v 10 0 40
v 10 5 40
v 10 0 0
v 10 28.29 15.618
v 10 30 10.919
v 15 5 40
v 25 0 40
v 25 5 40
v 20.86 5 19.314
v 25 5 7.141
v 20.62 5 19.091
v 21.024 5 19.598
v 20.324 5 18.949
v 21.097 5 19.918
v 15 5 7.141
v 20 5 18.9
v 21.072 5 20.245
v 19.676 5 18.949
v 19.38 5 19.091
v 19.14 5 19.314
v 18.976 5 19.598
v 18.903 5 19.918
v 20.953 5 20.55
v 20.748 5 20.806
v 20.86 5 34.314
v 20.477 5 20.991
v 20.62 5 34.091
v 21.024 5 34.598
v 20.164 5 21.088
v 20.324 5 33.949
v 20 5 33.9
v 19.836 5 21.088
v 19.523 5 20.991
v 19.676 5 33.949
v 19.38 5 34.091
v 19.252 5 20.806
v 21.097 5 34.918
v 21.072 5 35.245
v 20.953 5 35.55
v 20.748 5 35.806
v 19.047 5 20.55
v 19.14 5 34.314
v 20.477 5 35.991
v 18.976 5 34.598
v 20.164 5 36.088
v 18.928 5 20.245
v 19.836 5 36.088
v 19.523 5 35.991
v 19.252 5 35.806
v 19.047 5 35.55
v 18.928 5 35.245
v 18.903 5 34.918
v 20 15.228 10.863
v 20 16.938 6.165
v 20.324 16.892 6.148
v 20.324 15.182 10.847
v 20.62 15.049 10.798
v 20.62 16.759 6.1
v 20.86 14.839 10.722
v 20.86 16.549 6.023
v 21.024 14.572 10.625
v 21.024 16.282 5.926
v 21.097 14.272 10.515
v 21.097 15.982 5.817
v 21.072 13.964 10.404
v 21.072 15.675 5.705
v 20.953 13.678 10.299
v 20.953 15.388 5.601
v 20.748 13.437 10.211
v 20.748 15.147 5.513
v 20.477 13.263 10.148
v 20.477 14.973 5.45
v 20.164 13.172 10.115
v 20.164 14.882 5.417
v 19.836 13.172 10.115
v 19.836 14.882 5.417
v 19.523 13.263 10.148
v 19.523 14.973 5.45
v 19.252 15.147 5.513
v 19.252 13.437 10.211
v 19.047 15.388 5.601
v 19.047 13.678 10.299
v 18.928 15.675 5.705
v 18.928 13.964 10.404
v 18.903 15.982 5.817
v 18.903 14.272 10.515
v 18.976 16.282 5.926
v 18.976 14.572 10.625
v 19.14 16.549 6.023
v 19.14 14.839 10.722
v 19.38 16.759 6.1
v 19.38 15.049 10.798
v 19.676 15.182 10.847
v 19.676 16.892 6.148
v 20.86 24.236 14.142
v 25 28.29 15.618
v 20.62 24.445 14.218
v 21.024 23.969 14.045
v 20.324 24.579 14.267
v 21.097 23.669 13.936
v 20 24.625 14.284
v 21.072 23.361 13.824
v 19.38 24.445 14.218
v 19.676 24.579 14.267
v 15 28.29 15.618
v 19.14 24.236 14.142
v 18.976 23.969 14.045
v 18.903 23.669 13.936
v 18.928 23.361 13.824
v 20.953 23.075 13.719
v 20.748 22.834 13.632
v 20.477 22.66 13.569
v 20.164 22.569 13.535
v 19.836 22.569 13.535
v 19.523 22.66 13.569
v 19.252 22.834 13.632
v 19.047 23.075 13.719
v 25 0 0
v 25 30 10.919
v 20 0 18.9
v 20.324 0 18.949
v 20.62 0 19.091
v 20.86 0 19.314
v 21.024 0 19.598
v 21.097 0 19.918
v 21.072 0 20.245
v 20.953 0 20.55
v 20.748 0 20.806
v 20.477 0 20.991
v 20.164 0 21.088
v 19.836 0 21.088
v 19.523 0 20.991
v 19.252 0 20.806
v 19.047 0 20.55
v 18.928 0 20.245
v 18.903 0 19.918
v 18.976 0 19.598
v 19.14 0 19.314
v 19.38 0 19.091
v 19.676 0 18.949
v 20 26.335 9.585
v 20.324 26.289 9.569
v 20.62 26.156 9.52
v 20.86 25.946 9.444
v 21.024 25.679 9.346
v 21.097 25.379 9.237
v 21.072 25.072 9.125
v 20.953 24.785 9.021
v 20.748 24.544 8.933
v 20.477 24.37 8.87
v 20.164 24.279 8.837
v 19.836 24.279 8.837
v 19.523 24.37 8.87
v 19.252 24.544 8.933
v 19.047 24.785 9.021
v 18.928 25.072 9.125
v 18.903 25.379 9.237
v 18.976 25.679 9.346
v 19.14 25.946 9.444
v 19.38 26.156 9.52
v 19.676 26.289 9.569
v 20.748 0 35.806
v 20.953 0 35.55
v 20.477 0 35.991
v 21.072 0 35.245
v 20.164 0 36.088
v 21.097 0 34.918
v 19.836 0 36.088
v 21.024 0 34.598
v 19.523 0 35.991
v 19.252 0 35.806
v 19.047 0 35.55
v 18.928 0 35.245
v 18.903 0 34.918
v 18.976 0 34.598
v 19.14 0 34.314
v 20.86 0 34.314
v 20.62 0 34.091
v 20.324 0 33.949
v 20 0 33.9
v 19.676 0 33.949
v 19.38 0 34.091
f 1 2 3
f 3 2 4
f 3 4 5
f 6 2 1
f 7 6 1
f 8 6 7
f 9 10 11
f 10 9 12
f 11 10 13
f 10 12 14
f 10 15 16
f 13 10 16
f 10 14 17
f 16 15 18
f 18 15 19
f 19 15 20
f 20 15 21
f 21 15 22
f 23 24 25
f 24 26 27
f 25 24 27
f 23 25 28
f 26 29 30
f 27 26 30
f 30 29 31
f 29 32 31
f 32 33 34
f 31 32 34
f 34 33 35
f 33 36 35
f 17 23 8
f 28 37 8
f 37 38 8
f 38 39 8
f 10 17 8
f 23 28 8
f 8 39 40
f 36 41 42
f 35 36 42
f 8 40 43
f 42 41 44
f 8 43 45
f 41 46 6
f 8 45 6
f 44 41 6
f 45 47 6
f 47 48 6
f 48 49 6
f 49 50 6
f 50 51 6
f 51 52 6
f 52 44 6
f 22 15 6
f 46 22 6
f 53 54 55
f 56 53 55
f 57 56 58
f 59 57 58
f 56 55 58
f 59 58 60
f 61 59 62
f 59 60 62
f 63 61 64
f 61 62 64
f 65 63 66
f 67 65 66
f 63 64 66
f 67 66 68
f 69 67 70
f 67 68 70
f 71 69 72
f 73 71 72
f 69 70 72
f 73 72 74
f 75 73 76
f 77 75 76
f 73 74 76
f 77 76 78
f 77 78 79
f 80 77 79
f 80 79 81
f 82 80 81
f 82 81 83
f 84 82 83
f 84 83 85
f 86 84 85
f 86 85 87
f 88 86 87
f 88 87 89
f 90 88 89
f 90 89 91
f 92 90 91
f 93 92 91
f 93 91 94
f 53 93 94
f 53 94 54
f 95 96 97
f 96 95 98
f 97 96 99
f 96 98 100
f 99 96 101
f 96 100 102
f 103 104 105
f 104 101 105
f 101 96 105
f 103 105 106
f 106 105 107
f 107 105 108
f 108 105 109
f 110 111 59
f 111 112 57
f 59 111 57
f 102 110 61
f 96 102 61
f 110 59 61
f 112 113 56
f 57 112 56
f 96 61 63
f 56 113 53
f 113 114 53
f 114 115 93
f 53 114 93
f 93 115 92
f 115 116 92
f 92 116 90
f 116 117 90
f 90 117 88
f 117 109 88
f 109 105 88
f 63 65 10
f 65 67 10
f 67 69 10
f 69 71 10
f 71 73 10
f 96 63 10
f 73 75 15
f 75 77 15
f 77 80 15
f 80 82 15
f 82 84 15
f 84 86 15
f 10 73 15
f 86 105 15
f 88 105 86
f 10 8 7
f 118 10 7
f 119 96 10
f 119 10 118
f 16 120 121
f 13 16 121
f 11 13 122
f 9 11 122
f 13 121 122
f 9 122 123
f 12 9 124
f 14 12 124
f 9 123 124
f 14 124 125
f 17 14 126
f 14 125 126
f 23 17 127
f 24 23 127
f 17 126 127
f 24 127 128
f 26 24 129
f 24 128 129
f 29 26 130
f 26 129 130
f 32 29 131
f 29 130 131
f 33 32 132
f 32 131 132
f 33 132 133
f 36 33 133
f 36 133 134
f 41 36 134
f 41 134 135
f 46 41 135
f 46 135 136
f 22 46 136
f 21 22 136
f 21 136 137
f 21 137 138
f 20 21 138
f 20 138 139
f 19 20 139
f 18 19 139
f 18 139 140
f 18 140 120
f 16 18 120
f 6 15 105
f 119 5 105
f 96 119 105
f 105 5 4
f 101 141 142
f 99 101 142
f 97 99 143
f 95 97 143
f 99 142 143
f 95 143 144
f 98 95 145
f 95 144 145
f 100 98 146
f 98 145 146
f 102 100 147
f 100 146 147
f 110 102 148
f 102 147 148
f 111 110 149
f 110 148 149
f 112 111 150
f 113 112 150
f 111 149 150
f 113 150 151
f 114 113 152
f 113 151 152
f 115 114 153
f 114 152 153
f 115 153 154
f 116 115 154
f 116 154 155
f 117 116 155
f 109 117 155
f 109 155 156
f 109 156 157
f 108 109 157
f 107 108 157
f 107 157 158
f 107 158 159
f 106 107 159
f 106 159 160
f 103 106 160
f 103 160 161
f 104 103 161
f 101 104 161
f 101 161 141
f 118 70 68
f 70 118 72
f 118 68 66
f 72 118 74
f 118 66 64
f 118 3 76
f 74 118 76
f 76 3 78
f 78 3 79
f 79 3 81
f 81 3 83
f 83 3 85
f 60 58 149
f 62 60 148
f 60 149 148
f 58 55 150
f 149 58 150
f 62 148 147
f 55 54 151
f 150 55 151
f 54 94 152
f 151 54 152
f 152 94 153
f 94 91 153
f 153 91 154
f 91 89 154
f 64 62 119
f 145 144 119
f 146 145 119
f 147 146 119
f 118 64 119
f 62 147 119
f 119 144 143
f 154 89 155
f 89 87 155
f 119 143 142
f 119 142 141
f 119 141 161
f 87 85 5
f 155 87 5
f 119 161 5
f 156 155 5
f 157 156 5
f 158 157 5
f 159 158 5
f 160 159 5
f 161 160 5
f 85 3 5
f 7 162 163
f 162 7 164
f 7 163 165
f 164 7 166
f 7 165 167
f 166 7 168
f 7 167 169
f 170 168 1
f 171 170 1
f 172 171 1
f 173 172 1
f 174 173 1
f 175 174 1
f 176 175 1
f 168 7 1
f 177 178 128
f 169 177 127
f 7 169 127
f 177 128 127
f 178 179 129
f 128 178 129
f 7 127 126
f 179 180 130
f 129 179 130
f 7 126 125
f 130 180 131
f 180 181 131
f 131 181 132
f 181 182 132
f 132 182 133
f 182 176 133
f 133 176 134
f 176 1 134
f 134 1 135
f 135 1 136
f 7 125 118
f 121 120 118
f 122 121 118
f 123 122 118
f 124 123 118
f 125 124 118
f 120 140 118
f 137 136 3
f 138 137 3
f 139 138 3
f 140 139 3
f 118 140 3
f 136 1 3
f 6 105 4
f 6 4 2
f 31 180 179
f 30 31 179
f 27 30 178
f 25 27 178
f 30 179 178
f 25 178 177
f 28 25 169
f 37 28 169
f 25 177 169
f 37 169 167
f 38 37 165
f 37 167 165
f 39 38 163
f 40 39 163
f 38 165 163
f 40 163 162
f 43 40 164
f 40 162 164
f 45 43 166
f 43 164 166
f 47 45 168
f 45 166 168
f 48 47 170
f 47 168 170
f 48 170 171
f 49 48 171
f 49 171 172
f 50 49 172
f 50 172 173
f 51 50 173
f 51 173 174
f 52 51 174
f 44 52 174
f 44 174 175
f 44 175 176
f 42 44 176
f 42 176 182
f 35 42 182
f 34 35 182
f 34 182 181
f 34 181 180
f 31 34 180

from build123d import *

# Parameters (mm, degrees)
SKETCH1_W           = 15
SKETCH1_H           = 30
BOSS_EXTRUDE1_DEPTH = 40
CUT_EXTRUDE1_DEPTH  = 40
BOSS_EXTRUDE2_DEPTH = 10
CUT_EXTRUDE2_DEPTH  = 10
CUT_EXTRUDE3_DEPTH  = 10
SKETCH7_R           = 1.1
CUT_EXTRUDE4_DEPTH  = 10
SKETCH8_R           = 1.1
CUT_EXTRUDE5_DEPTH  = 10


with BuildPart() as part:
    # Sketch1 → Boss-Extrude1 (new body)
    with BuildSketch(Plane.XY):
        with Locations((7.5, 15)):
            Rectangle(SKETCH1_W, SKETCH1_H)
    extrude(amount=BOSS_EXTRUDE1_DEPTH)

    # Sketch2 → Cut-Extrude1 (cut)
    with BuildSketch(Plane(origin=(15, 0, 0), x_dir=(0, 0, -1), z_dir=(1, 0, 0))):
        Polygon((0, 0), (-10.919107028, 30), (0, 30), align=None)
    extrude(amount=-CUT_EXTRUDE1_DEPTH, mode=Mode.SUBTRACT)

    # Sketch3 → Boss-Extrude2 (add)
    with BuildSketch(Plane(origin=(15, 0, 0), x_dir=(0, 0, -1), z_dir=(1, 0, 0))):
        Polygon((-10.919107028, 30), (-15.617570132, 28.289899283), (-7.140740034, 5), (-40, 5), (-40, 0), (0, 0), align=None)
    extrude(amount=BOSS_EXTRUDE2_DEPTH)

    # Sketch5 → Cut-Extrude2 (cut)
    with BuildSketch(Plane.ZY):
        Polygon((10.919107028, 30), (40, 30), (40, 0), (0, 0), align=None)
    extrude(amount=-CUT_EXTRUDE2_DEPTH, mode=Mode.SUBTRACT)

    # Sketch6 → Cut-Extrude3 (cut)
    with BuildSketch(Plane(origin=(15, 0, 0), x_dir=(0, 0, -1), z_dir=(1, 0, 0))):
        Polygon((-15.617570132, 28.289899283), (-40, 5), (-40, 30), (-10.919107028, 30), align=None)
    extrude(amount=-CUT_EXTRUDE3_DEPTH, mode=Mode.SUBTRACT)

    # Sketch7 → Cut-Extrude4 (cut)
    with BuildSketch(Plane.XZ):
        with Locations(Location((20, 35, 0), (0, 0, 270))):
            Circle(SKETCH7_R)
        with Locations(Location((20, 20, 0), (0, 0, 270))):
            Circle(SKETCH7_R)
    extrude(amount=-CUT_EXTRUDE4_DEPTH, mode=Mode.SUBTRACT)

    # Sketch8 → Cut-Extrude5 (cut)
    with BuildSketch(Plane(origin=(0, 0, 0), x_dir=(-1, 0, 0), z_dir=(0, 0.342020143325663, -0.9396926207859105))):
        with Locations(Location((-20, 26.925333174, 0), (0, 0, 90))):
            Circle(SKETCH8_R)
        with Locations(Location((-20, 16.925333174, 0), (0, 0, 90))):
            Circle(SKETCH8_R)
    extrude(amount=-CUT_EXTRUDE5_DEPTH, mode=Mode.SUBTRACT)


solid = part.part
